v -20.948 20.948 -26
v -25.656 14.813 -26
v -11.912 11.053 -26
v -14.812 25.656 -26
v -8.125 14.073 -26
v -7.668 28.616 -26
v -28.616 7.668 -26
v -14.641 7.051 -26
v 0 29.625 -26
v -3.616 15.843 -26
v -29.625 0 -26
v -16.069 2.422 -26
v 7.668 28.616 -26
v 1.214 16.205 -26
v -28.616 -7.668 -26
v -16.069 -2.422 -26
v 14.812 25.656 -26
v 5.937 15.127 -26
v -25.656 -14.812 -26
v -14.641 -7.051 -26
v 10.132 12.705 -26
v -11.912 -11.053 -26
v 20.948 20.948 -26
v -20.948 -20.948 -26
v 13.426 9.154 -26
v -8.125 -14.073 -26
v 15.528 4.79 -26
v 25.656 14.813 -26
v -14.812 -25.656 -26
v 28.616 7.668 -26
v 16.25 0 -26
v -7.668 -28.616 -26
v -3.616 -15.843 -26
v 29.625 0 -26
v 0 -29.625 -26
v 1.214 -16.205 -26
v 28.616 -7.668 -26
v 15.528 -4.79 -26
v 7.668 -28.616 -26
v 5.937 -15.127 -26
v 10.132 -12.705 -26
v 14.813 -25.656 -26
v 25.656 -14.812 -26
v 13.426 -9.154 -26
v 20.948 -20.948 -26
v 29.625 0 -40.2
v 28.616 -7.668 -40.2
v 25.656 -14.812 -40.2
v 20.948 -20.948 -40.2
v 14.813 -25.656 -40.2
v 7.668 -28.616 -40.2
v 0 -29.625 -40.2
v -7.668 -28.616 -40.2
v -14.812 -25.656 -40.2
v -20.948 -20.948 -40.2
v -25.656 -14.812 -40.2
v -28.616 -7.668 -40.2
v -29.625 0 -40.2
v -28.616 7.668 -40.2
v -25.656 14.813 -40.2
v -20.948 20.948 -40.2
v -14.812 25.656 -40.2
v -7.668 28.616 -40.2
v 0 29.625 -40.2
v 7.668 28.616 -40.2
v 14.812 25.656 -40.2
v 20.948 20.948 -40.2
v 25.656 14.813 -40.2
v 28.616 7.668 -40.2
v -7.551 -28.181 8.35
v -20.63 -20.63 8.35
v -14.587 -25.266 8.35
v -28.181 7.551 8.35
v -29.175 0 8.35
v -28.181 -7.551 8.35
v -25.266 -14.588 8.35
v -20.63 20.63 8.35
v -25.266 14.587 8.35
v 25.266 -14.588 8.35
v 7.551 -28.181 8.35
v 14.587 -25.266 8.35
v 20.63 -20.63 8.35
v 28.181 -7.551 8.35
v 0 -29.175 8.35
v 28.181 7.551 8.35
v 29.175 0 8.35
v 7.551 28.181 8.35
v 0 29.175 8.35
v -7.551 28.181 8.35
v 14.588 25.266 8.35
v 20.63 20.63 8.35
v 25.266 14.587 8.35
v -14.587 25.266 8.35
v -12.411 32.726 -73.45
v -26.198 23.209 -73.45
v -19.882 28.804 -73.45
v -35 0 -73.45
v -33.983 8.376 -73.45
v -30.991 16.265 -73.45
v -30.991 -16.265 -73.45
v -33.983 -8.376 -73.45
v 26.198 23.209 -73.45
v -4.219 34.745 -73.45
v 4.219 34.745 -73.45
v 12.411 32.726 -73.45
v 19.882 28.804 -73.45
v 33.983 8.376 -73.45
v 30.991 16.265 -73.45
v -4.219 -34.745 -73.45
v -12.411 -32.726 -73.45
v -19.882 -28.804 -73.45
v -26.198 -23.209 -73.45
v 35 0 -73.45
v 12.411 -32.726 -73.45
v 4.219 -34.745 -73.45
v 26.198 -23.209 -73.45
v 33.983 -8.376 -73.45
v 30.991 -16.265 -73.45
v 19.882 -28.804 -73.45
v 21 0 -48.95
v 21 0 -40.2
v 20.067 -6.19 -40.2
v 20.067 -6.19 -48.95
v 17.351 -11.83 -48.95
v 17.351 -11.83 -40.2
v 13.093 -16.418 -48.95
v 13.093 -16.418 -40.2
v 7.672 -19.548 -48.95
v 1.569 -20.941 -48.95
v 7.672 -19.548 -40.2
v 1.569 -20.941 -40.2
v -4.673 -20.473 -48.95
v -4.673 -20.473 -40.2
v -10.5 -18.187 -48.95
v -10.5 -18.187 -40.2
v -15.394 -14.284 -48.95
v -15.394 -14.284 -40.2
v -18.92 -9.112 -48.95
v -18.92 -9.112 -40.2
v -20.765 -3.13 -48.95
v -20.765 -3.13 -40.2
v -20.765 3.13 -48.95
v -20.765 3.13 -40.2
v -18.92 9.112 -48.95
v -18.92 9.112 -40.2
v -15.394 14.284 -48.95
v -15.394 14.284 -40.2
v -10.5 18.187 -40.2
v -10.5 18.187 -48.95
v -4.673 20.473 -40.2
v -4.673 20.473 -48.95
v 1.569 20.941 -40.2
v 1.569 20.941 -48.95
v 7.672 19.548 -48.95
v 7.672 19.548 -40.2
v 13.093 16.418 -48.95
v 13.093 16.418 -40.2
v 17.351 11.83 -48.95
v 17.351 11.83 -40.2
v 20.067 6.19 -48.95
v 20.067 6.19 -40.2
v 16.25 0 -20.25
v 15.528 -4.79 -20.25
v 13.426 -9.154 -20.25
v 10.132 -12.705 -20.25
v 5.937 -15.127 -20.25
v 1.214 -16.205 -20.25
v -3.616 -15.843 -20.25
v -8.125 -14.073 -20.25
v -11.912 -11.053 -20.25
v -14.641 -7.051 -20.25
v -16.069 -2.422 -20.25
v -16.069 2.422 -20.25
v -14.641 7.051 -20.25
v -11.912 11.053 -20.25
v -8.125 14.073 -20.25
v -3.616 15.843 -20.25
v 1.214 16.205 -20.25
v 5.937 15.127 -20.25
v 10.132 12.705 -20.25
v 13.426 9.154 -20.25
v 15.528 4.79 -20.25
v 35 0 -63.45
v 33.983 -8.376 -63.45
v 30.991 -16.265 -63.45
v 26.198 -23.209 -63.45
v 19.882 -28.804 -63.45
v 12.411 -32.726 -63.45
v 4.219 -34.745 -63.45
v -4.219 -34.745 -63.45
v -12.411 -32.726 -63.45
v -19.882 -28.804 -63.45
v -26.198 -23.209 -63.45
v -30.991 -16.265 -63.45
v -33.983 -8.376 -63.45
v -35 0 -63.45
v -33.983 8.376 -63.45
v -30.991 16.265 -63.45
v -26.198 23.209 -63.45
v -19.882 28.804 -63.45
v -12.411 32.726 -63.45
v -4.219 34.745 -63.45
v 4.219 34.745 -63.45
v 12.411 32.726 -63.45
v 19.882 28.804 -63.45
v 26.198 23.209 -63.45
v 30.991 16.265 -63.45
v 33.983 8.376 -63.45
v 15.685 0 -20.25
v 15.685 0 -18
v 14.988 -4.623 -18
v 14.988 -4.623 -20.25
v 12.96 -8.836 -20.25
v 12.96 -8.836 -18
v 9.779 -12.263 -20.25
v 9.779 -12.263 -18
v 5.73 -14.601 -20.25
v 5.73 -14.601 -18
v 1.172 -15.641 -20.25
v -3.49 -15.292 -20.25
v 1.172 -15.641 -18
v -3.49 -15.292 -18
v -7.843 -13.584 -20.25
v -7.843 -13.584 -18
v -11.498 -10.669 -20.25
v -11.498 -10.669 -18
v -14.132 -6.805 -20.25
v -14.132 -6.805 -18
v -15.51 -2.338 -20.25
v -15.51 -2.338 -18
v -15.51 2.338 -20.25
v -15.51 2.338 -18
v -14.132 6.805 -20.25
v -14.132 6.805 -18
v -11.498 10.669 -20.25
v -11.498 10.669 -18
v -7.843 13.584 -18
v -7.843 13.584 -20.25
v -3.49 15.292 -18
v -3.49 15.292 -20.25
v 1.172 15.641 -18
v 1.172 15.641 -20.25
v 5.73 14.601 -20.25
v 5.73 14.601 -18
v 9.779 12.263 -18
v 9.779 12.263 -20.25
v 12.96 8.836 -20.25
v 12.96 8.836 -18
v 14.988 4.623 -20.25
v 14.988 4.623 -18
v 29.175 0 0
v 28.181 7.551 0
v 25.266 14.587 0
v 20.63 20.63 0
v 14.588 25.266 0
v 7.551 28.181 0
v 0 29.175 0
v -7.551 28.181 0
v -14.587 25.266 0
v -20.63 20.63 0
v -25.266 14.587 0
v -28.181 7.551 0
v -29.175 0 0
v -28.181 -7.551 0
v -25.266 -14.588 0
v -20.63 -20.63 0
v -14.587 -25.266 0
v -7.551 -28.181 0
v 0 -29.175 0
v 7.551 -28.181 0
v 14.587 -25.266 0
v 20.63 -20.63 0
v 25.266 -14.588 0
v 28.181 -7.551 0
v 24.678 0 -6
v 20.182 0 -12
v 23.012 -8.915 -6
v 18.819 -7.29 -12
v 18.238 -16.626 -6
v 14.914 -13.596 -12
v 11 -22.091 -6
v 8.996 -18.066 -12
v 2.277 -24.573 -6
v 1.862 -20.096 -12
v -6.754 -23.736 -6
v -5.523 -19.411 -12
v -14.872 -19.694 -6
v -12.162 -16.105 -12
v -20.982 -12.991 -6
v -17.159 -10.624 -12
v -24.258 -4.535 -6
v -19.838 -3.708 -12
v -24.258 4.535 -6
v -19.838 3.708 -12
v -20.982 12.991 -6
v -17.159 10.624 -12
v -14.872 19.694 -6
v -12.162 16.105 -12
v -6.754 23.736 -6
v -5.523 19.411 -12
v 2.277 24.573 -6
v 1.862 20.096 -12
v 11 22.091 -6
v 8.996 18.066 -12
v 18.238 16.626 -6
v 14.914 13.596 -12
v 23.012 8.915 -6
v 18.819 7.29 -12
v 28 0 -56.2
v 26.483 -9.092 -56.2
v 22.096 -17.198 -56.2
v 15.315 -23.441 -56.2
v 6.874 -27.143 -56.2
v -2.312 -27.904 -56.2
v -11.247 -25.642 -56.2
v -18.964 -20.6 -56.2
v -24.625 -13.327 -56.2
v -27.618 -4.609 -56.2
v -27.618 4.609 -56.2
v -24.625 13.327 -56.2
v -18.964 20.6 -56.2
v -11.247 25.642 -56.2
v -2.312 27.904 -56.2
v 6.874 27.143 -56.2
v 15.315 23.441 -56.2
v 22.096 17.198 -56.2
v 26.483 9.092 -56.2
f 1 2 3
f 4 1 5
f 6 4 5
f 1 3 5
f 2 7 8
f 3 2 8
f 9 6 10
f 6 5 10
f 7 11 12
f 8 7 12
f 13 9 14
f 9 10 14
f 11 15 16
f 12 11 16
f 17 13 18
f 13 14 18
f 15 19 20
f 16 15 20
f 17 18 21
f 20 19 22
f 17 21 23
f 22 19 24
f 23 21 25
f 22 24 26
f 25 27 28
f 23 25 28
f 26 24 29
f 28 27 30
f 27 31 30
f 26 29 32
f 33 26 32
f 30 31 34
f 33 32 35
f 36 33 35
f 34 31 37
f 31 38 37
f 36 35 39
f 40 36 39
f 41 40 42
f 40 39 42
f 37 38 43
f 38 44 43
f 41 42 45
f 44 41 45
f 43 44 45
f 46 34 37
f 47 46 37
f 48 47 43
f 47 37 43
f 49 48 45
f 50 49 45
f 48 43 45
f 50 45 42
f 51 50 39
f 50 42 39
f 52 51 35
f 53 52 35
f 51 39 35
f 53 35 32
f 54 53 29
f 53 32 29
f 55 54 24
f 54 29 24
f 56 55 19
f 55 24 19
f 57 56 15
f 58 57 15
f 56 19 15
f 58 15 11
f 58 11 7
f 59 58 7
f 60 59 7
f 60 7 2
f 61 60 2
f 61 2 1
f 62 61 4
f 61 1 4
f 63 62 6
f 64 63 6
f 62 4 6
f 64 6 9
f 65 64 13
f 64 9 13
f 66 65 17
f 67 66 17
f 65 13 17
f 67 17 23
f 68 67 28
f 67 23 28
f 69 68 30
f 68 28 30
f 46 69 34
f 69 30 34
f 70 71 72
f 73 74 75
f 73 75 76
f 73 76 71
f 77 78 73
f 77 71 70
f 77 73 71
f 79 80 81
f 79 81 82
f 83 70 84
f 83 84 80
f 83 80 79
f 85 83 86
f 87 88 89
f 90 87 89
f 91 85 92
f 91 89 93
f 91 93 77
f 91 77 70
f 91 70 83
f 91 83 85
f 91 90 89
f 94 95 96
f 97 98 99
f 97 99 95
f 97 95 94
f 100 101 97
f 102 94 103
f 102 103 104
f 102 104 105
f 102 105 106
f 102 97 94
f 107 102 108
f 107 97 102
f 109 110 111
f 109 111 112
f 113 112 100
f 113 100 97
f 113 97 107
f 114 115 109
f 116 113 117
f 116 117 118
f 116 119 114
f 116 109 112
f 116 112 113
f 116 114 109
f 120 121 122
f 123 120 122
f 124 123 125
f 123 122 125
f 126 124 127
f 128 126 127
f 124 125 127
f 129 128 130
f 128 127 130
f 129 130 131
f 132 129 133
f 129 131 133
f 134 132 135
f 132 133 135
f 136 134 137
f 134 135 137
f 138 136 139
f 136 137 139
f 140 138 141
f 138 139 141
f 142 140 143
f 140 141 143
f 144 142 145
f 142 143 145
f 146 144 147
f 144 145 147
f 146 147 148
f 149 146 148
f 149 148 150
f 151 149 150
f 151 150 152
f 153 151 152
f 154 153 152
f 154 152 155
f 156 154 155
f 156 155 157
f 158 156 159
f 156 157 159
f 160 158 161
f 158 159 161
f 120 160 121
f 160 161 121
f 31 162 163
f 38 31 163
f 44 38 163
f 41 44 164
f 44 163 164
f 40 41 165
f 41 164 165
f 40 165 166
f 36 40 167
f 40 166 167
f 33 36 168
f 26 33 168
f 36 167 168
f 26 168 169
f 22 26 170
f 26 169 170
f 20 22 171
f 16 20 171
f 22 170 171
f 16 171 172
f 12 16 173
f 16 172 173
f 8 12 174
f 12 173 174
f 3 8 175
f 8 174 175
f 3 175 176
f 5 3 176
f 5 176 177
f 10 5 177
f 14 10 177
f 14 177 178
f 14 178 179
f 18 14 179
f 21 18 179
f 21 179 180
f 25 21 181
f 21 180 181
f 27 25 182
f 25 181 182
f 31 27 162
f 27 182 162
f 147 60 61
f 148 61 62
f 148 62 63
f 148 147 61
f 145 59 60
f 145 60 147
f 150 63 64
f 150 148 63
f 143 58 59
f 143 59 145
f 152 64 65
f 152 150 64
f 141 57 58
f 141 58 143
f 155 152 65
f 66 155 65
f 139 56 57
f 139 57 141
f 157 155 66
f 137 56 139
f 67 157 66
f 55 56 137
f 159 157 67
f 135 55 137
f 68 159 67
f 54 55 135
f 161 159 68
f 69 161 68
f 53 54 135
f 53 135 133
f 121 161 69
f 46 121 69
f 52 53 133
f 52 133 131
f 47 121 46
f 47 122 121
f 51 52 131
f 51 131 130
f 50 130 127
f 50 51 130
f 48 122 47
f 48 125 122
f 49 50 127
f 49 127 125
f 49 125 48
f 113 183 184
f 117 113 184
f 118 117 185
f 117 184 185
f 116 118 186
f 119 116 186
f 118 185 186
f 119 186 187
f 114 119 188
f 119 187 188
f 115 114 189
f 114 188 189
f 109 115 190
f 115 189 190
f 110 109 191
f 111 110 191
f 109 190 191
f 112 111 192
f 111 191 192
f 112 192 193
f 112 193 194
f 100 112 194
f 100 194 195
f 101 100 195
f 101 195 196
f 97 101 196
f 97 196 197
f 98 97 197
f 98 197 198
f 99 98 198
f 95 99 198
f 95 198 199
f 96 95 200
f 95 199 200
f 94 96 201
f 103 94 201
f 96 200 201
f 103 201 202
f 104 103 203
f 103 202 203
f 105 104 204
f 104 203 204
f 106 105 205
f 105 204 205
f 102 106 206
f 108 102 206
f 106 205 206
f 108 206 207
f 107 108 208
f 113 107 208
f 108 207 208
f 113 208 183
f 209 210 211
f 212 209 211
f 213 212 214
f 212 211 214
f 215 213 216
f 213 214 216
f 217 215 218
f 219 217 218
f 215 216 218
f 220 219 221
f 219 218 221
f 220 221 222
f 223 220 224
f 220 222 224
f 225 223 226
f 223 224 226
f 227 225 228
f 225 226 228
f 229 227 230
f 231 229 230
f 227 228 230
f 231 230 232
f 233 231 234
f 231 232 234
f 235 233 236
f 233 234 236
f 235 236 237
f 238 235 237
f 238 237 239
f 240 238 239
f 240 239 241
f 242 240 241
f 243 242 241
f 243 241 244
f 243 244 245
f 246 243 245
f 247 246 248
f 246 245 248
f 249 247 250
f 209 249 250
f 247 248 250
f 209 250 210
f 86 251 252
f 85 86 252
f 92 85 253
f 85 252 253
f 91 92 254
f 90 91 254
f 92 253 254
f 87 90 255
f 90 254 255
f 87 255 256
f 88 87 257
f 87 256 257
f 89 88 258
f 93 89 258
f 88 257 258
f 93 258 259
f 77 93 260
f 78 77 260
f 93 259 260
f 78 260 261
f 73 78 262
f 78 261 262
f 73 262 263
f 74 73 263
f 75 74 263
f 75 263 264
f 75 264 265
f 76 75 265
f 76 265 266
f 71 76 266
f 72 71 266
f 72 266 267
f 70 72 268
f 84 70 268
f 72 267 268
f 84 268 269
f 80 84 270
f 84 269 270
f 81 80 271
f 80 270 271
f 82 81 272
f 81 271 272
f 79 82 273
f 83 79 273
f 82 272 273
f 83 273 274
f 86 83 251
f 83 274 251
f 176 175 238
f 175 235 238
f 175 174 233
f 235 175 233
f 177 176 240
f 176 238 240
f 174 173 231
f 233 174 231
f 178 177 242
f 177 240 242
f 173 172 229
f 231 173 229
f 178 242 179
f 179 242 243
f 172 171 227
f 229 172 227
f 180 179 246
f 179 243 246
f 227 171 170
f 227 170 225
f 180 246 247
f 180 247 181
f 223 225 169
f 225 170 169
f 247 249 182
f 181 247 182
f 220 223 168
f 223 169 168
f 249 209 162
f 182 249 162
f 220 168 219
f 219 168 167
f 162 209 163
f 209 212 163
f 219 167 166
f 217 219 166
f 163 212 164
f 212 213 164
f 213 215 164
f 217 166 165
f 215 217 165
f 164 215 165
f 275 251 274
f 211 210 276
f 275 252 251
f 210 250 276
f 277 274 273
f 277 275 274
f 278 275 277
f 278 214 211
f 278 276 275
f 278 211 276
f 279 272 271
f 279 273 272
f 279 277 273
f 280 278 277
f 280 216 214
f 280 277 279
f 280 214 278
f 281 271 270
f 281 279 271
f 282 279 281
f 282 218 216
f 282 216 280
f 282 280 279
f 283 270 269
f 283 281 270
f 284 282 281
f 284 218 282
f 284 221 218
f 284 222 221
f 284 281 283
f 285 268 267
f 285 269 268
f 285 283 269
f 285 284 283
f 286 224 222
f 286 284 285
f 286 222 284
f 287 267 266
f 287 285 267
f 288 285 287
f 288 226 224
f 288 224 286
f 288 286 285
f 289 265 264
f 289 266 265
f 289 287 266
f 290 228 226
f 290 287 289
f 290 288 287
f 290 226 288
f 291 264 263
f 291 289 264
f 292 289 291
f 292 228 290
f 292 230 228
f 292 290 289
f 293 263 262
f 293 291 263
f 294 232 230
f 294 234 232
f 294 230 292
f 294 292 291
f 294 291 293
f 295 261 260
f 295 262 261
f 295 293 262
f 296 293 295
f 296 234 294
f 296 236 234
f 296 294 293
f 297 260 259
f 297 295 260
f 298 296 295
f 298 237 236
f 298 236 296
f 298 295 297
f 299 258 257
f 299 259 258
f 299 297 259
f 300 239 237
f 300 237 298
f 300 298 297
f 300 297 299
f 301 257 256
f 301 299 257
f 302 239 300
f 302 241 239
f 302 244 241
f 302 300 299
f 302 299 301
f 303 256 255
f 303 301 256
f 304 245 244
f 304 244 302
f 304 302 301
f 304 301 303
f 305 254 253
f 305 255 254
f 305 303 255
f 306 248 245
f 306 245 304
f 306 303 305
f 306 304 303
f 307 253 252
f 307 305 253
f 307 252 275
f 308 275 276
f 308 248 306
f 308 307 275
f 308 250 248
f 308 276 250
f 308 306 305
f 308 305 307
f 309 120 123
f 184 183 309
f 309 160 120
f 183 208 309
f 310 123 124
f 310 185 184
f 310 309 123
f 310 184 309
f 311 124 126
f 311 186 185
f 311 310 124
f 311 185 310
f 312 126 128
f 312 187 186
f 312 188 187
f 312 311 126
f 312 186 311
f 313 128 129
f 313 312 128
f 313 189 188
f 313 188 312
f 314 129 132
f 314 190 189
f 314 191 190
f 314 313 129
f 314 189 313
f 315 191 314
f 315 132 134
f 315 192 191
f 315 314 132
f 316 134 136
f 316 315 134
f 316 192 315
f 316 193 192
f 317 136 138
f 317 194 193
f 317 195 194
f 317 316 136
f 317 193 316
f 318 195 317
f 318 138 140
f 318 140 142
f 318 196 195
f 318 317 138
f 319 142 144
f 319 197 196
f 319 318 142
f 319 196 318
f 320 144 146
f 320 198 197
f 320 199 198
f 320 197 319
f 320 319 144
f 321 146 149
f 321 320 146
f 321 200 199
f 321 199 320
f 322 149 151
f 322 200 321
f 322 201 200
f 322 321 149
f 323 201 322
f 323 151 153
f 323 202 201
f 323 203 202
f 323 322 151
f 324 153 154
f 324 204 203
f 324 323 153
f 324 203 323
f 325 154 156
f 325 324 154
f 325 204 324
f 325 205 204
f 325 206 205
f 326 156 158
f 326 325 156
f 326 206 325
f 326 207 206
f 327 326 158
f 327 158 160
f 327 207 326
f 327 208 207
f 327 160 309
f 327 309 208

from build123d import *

# Parameters (mm, degrees)
F0_R       = 29.175
F1_DEPTH   = 8.35
F1_FACE_R  = 29.175
F3_R       = 15.685
F5_R       = 15.685
F6_DEPTH   = 2.25
F7_R       = 16.25
F8_DEPTH   = 5.75
F9_R       = 29.625
F10_DEPTH  = 14.2
F11_R      = 21
F12_DEPTH  = 8.75
F12_FACE_R = 21
F14_R      = 35
F16_R      = 35
F17_DEPTH  = 10


with BuildPart() as f1:
    # F0 (on Top) → F1 (new body)
    with BuildSketch(Plane.XY):
        Circle(F0_R)
    extrude(amount=F1_DEPTH)

    # F1_face (on face) → F4 section 0
    with BuildSketch(Plane(origin=(0, 0, 0), x_dir=(1, 0, 0), z_dir=(0, 0, -1))):
        Circle(F1_FACE_R)
    # F3 (on offset) → F4 section 1
    with BuildSketch(Plane(origin=(0, 0, -18), x_dir=(1, 0, 0), z_dir=(0, 0, -1))):
        Circle(F3_R)
    loft()

    # F5 (on face) → F6 (join)
    with BuildSketch(Plane(origin=(0, 0, -18), x_dir=(1, 0, 0), z_dir=(0, 0, -1))):
        Circle(F5_R)
    extrude(amount=F6_DEPTH)

    # F7 (on face) → F8 (join)
    with BuildSketch(Plane(origin=(0, 0, -20.25), x_dir=(1, 0, 0), z_dir=(0, 0, -1))):
        Circle(F7_R)
    extrude(amount=F8_DEPTH)

    # F9 (on face) → F10 (join)
    with BuildSketch(Plane(origin=(0, 0, -26), x_dir=(1, 0, 0), z_dir=(0, 0, -1))):
        Circle(F9_R)
    extrude(amount=F10_DEPTH)

    # F11 (on face) → F12 (join)
    with BuildSketch(Plane(origin=(0, 0, -40.2), x_dir=(1, 0, 0), z_dir=(0, 0, -1))):
        Circle(F11_R)
    extrude(amount=F12_DEPTH)

    # F12_face (on face) → F15 section 0
    with BuildSketch(Plane(origin=(0, 0, -48.95), x_dir=(1, 0, 0), z_dir=(0, 0, -1))):
        Circle(F12_FACE_R)
    # F14 (on offset) → F15 section 1
    with BuildSketch(Plane(origin=(0, 0, -63.45), x_dir=(1, 0, 0), z_dir=(0, 0, -1))):
        Circle(F14_R)
    loft()

    # F16 (on face) → F17 (join)
    with BuildSketch(Plane(origin=(0, 0, -63.45), x_dir=(1, 0, 0), z_dir=(0, 0, -1))):
        Circle(F16_R)
    extrude(amount=F17_DEPTH)


solid = f1.part
